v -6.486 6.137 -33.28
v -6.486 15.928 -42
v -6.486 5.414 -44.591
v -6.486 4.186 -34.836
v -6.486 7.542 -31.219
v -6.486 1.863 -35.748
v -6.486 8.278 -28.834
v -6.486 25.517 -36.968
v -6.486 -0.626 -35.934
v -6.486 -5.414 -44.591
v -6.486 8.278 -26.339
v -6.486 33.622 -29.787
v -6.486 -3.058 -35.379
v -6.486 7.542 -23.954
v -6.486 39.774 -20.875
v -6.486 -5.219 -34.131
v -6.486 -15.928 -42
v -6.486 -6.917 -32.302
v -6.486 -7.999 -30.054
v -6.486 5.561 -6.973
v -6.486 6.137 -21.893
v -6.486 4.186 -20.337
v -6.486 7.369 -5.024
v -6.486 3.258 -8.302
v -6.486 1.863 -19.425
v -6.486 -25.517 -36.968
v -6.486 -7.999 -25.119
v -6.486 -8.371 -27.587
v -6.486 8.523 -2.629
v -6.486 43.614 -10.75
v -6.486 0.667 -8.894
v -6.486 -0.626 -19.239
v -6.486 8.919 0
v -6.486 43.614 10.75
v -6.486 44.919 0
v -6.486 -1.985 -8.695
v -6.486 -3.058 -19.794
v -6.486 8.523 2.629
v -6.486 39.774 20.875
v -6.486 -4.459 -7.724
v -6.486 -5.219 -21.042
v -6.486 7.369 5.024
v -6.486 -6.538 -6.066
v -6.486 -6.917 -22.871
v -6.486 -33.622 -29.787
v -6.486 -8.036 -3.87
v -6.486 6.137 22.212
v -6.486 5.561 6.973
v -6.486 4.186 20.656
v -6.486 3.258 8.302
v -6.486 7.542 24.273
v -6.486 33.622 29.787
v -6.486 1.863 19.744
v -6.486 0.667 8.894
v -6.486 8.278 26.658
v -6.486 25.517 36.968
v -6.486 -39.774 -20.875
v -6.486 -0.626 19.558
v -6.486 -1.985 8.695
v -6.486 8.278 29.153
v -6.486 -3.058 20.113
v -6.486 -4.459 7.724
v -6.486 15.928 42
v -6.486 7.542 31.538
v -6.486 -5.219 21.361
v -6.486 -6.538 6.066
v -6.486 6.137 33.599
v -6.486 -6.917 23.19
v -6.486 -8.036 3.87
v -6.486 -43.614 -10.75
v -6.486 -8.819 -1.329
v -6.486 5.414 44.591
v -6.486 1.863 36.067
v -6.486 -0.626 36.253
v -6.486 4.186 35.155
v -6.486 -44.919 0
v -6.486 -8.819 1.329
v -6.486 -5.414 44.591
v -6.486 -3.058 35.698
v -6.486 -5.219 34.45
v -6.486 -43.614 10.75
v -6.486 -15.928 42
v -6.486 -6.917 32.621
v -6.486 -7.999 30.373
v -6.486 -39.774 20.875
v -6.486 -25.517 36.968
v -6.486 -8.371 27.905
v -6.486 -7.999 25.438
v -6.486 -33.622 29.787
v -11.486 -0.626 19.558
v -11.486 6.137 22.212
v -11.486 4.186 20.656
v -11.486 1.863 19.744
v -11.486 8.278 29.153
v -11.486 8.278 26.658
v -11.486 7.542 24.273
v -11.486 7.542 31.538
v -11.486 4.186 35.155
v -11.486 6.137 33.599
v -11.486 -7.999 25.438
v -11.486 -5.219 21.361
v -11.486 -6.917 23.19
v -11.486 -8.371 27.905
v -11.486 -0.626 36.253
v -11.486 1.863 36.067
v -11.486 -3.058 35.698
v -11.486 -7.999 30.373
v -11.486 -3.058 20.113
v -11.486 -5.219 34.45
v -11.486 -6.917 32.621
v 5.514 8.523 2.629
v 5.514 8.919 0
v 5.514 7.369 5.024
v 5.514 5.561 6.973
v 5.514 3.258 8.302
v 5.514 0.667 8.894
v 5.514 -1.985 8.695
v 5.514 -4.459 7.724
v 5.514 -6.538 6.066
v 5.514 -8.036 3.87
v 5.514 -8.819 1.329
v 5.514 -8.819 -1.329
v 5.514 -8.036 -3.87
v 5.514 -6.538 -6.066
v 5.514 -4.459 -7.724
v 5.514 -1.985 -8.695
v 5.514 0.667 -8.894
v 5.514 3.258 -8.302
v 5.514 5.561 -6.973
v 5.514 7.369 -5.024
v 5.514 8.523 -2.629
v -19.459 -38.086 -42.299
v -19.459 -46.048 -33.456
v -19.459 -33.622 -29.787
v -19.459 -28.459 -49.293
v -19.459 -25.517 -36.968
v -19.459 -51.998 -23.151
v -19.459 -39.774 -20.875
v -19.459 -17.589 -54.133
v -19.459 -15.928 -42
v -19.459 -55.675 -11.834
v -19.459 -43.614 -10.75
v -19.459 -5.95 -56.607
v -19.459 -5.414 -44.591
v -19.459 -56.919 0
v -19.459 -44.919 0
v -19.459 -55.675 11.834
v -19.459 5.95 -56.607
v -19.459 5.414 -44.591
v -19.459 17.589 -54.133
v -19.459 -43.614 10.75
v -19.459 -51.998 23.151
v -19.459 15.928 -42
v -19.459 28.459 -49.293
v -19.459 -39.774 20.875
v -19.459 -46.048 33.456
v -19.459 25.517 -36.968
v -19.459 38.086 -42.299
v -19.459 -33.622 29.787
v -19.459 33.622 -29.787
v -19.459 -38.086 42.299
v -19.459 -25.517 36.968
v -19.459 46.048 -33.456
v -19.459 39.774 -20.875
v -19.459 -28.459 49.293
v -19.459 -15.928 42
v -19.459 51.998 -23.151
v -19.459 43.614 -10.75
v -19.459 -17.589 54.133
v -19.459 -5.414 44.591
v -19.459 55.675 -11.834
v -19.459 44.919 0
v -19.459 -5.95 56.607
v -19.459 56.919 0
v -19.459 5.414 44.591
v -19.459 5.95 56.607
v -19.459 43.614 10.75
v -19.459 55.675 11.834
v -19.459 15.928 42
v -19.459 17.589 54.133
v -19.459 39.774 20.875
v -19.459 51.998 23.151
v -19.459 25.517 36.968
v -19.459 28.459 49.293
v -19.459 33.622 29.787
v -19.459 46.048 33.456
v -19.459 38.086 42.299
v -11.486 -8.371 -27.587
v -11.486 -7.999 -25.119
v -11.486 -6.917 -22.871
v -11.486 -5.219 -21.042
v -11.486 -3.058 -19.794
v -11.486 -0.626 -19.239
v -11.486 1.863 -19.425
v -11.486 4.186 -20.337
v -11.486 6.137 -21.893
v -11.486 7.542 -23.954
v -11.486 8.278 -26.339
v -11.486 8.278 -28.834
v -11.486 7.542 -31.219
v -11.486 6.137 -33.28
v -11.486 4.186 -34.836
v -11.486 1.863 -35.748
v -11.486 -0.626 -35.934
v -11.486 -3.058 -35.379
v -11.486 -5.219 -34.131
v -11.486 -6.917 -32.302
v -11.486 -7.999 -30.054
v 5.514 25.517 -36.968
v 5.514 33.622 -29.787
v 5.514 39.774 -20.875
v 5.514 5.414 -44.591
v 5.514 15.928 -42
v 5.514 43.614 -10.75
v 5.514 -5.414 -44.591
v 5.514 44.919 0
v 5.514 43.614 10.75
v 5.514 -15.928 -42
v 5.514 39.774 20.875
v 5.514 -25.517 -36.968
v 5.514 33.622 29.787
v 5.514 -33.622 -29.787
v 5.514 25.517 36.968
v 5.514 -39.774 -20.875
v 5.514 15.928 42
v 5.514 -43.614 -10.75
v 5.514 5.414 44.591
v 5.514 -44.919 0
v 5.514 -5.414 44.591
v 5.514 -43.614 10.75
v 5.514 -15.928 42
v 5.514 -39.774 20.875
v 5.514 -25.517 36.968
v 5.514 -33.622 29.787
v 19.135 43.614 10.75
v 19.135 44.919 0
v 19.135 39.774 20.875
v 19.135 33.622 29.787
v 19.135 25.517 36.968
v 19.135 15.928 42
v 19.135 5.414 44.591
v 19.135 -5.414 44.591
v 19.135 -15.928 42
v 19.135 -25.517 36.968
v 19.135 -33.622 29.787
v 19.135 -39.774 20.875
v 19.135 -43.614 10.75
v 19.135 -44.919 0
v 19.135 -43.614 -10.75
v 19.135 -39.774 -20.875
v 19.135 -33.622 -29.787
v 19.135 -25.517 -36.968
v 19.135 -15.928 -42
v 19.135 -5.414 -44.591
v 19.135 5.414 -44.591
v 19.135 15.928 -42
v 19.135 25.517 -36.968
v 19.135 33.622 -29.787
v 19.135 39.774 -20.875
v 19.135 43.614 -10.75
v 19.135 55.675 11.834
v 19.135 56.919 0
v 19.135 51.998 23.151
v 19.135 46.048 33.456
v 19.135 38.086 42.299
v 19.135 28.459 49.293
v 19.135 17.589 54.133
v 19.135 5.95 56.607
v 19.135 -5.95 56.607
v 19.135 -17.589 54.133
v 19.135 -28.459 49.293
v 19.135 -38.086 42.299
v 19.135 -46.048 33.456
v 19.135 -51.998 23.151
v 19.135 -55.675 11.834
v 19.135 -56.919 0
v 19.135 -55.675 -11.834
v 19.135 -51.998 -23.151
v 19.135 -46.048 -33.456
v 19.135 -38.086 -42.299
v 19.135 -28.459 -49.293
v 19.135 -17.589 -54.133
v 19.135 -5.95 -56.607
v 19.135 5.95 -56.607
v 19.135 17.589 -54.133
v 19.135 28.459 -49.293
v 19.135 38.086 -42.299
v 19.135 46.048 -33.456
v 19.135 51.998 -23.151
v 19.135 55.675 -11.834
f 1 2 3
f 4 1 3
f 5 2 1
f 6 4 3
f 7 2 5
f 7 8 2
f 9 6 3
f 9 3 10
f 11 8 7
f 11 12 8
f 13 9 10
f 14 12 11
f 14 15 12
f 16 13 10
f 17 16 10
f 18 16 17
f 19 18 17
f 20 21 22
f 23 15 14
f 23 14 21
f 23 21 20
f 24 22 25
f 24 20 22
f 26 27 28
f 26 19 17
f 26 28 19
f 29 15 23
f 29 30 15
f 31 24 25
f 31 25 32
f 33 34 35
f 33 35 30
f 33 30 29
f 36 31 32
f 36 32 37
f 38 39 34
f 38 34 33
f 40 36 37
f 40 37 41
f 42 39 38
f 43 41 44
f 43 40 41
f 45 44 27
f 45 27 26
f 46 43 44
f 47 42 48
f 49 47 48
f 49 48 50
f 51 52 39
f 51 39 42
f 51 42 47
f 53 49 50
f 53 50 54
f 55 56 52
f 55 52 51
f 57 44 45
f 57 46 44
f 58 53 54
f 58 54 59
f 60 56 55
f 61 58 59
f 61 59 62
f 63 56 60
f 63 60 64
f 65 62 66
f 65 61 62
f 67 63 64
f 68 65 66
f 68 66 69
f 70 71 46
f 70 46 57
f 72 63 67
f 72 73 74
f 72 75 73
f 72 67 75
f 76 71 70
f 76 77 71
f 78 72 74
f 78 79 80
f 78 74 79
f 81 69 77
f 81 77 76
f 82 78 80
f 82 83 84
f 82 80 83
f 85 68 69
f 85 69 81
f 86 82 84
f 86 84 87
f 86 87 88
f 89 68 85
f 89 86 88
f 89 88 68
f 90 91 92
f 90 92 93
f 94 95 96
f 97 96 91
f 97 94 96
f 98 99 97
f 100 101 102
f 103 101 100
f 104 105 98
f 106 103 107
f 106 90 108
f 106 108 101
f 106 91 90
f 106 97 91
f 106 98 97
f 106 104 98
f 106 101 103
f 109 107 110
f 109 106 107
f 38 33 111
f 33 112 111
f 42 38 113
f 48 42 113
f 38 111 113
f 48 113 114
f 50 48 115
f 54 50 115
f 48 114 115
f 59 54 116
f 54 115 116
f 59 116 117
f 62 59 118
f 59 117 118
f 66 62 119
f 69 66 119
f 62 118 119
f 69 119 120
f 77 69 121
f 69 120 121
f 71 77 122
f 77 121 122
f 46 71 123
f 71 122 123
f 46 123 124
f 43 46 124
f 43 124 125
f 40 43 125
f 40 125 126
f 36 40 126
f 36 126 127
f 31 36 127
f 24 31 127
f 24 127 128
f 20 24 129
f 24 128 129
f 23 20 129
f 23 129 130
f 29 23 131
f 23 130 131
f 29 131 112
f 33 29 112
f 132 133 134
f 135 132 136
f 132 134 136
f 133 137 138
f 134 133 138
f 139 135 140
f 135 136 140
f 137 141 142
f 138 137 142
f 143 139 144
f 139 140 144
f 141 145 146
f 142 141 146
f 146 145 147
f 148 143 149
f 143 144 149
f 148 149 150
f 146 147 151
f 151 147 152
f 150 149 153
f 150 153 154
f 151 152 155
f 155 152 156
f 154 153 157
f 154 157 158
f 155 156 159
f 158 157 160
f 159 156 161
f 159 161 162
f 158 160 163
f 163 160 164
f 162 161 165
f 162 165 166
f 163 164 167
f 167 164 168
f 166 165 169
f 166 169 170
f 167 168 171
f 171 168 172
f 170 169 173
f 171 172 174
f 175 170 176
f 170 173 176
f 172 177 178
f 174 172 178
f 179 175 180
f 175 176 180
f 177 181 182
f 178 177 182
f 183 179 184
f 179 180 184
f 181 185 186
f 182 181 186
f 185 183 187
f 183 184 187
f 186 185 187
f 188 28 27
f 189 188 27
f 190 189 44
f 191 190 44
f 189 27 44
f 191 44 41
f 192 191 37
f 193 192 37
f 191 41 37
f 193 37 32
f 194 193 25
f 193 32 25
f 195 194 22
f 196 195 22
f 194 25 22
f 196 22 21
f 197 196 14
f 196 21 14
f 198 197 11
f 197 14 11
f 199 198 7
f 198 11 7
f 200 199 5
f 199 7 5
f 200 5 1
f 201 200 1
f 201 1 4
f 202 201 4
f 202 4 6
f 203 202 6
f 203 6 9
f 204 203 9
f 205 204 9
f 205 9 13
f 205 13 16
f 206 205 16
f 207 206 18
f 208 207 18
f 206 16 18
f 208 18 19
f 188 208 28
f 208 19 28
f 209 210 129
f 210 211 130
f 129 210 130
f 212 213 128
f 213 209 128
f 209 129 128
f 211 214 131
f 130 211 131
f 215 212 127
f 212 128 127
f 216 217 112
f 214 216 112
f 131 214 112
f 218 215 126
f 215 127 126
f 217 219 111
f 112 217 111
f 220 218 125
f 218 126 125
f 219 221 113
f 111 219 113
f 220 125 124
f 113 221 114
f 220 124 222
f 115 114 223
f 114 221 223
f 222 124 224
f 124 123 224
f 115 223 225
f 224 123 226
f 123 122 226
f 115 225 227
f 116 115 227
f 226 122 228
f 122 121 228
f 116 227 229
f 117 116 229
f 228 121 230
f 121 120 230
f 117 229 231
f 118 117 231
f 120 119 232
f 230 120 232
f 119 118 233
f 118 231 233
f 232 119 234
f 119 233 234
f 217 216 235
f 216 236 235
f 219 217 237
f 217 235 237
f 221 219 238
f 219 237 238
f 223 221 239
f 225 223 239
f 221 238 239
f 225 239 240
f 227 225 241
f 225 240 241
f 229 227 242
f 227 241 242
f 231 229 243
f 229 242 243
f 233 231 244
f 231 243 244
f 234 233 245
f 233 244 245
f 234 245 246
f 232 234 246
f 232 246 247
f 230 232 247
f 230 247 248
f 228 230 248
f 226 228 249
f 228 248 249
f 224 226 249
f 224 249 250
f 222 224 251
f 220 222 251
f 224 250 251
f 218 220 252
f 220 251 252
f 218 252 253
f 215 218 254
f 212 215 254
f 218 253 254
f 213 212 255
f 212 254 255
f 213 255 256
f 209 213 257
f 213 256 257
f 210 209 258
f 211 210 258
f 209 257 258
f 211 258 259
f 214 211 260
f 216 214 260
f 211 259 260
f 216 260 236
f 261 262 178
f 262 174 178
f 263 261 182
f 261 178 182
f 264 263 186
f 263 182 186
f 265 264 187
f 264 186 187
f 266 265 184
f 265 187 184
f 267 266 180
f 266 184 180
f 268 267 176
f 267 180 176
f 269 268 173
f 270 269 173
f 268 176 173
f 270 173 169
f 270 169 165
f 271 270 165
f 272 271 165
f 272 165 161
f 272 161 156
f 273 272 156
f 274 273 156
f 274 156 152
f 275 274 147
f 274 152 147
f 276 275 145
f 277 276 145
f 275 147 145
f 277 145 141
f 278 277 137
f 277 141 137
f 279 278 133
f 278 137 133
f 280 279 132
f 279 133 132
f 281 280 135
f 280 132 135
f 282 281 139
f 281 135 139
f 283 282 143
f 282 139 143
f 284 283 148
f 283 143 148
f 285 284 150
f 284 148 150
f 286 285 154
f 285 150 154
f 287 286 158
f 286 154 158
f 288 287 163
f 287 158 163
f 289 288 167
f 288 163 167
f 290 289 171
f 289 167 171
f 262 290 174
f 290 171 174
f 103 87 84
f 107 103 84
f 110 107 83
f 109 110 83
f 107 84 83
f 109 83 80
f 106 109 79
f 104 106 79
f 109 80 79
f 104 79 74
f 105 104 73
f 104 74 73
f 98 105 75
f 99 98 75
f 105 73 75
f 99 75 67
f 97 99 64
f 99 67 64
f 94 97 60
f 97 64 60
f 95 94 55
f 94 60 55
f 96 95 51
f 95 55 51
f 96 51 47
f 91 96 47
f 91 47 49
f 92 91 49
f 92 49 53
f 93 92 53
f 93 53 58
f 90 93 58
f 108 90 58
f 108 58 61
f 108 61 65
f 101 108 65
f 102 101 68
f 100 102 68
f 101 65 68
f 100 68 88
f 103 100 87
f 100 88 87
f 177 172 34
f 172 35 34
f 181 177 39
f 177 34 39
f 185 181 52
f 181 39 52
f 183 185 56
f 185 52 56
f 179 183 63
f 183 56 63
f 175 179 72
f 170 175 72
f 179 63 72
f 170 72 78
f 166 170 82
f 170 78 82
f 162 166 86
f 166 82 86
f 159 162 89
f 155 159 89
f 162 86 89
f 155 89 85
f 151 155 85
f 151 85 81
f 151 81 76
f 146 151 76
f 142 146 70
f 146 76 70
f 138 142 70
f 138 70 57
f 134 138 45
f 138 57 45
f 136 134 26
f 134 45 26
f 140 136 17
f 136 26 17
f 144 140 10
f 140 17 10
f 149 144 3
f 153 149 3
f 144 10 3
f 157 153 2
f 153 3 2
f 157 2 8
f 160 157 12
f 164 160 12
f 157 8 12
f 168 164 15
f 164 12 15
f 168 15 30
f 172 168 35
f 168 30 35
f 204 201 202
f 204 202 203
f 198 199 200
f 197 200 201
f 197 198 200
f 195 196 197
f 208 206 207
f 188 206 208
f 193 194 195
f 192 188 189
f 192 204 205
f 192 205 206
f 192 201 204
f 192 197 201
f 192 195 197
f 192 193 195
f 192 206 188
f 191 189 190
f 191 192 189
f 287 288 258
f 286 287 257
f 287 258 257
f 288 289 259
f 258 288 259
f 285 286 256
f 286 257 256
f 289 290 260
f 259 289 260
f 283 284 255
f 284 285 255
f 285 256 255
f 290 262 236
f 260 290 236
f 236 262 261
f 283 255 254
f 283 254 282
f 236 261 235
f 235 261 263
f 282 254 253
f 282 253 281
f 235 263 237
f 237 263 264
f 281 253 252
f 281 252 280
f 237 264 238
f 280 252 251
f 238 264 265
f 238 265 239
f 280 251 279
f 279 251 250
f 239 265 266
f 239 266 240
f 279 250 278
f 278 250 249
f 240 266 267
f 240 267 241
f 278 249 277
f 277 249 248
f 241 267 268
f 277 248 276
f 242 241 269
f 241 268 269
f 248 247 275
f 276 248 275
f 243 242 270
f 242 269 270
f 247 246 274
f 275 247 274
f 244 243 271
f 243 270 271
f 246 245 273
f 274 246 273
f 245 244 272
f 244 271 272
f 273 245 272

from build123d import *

# Parameters (mm, degrees)
F0_W     = 12
F0_H     = 35.9999971587
F2_R     = 8.3712602983
F3_DEPTH = 5


with BuildPart() as f1:
    # F0 (on Top) → F1 (revolve)
    with BuildSketch(Plane.XY):
        Polygon((-19.4594625823, 44.9189218498), (-6.4864925787, 44.9189218498), (5.5135074213, 44.9189218498), (19.1351225156, 44.9189218498), (19.1351225156, 56.9189218498), (-19.4594625823, 56.9189218498), align=None)
        with Locations((-0.4864925787, 26.9189232705)):
            Rectangle(F0_W, F0_H)
    revolve(axis=Axis((2.7567485016, 0, 0), (1, 0, 0)))

    # F2 (on face) → F3 (join)
    with BuildSketch(Plane(origin=(-6.4864925787, 0, 0), x_dir=(0, -1, 0), z_dir=(-1, 0, 0))):
        with Locations((0, 27.9054697603)):
            Circle(F2_R)
        with Locations((0, -27.5865457952)):
            Circle(F2_R)
    extrude(amount=F3_DEPTH)


solid = f1.part
